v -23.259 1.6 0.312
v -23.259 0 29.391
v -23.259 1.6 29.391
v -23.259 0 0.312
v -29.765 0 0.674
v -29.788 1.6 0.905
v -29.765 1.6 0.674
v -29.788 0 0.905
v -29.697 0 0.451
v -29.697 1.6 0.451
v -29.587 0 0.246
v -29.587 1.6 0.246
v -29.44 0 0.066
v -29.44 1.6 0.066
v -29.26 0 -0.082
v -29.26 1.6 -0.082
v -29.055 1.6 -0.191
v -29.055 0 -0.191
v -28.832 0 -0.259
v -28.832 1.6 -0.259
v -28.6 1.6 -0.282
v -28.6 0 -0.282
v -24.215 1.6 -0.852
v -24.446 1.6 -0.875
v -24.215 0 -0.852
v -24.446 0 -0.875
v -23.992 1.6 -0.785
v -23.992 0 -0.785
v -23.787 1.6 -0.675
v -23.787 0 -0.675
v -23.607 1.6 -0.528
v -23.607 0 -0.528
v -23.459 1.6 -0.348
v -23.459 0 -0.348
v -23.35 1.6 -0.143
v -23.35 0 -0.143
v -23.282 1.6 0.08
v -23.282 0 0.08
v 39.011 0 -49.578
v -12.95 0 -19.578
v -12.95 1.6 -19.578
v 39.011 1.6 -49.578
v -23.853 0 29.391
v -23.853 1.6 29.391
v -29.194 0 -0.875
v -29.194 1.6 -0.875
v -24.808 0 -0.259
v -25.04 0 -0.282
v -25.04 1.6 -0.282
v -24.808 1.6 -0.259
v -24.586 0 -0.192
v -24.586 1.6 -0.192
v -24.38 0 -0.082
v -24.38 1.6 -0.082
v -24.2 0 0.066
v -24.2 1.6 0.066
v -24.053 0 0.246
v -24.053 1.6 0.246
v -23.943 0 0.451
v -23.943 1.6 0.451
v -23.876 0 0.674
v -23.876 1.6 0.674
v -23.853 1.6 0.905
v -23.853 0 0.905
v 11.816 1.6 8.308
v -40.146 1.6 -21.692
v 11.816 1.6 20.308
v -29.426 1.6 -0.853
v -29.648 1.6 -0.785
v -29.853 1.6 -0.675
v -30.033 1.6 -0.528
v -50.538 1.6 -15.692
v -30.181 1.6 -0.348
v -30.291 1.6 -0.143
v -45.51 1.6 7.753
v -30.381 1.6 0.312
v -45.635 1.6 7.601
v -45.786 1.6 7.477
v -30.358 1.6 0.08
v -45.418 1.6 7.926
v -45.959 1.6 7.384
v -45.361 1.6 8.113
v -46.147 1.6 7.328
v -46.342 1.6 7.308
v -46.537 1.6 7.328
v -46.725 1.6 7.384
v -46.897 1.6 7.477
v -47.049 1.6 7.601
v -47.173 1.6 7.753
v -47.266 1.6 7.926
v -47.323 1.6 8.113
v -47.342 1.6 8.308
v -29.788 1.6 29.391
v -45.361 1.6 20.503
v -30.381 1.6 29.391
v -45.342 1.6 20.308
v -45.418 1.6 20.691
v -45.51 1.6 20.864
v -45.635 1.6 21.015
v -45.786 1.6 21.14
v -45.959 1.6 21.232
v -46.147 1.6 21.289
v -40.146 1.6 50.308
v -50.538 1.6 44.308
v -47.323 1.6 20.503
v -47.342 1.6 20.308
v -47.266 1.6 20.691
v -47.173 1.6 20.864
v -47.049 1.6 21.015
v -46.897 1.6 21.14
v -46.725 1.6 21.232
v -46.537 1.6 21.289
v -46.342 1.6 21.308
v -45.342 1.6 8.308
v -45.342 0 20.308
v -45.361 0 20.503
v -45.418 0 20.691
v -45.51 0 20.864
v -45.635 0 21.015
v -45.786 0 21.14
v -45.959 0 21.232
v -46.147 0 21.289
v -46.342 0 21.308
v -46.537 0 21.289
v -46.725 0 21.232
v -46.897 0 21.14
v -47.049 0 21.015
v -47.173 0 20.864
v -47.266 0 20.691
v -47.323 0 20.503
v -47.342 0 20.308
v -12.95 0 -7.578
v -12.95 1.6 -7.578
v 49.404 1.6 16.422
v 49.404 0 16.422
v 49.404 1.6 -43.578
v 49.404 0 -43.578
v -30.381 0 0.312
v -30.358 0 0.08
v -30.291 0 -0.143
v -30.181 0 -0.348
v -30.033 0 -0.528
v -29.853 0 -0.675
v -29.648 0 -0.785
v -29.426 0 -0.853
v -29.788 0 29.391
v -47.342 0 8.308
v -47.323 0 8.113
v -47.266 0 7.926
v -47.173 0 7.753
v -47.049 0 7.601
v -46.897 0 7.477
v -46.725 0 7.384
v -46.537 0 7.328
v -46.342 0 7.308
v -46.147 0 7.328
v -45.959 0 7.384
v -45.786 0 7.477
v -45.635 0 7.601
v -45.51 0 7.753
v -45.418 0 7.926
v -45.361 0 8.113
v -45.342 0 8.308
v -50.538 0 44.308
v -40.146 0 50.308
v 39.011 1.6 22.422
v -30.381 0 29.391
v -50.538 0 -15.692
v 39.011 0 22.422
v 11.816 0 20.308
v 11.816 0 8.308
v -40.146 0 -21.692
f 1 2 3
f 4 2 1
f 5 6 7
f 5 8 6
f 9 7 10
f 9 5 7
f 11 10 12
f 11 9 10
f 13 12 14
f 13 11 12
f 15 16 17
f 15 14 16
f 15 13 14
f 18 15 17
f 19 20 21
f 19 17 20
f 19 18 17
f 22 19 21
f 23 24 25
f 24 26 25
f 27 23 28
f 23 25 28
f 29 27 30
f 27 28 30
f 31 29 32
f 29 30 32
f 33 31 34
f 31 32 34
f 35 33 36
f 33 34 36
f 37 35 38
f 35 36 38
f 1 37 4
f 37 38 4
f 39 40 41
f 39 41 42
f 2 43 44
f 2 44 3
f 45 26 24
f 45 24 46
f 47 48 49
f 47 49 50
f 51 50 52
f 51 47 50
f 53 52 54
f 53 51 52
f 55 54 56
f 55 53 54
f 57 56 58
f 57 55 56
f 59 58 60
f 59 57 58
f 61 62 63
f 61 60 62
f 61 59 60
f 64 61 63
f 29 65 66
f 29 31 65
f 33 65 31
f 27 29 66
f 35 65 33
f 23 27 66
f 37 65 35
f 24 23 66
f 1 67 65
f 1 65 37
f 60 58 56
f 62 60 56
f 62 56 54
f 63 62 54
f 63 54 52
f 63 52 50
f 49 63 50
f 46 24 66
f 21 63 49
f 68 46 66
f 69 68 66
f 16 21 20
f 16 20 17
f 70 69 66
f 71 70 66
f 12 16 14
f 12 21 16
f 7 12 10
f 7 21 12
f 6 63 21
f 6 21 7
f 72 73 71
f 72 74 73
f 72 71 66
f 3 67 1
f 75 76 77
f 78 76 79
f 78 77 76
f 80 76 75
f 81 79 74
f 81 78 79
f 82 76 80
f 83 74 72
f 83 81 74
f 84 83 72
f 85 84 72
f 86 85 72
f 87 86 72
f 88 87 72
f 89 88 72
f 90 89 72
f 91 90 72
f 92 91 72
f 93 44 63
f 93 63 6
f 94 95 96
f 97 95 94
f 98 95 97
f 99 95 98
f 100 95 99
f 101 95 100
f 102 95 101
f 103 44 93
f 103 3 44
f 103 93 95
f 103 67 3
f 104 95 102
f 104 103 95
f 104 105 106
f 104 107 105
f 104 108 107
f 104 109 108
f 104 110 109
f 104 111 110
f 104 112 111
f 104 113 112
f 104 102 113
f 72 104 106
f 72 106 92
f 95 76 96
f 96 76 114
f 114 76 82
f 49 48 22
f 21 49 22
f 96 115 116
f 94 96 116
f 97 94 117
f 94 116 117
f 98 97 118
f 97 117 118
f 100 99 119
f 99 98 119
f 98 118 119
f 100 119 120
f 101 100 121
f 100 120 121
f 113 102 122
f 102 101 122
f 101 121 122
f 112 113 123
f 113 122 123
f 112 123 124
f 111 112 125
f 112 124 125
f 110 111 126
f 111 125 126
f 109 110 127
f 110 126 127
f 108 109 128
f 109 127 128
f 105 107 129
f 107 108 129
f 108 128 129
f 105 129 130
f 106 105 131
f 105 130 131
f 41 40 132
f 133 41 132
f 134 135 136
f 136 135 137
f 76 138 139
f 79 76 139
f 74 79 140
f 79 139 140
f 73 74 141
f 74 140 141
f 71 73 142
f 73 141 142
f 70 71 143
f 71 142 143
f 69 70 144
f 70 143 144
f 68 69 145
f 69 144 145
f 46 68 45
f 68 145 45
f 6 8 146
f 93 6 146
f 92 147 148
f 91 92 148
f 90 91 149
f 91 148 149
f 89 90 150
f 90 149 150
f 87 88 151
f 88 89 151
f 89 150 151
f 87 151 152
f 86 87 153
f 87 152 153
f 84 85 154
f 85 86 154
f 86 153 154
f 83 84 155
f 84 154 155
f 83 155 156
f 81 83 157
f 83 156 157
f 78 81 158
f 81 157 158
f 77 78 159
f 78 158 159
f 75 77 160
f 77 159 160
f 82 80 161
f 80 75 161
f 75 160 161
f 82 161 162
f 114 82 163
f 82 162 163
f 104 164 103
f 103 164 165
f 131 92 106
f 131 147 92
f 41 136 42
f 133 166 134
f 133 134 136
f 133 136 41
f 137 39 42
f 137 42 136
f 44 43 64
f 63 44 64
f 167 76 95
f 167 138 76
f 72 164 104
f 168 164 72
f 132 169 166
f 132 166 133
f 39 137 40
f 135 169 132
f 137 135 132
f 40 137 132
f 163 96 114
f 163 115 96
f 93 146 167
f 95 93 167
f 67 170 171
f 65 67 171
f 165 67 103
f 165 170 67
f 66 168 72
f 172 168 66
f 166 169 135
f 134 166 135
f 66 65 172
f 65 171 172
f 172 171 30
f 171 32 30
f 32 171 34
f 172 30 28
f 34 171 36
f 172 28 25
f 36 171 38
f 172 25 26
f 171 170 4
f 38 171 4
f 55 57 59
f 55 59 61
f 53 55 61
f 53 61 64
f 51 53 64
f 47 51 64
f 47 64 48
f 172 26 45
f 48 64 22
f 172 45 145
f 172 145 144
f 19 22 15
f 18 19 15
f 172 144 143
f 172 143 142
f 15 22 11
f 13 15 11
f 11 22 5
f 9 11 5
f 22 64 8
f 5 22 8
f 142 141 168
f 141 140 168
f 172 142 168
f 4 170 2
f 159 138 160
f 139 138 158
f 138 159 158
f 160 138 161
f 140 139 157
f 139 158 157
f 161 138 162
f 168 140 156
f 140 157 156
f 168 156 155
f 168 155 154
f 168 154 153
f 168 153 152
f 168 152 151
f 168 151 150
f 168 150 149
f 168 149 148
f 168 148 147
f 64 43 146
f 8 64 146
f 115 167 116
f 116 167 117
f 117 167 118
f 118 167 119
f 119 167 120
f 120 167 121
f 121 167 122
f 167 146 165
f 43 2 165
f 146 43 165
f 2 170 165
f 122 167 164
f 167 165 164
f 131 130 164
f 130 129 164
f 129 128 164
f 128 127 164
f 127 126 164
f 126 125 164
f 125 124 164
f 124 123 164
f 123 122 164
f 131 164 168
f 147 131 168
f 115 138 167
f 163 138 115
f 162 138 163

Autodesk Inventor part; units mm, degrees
ref_plane "YZ Plane" through (0, 0, 0) normal (1, 0, 0) x (0, 1, 0)
ref_plane "XZ Plane" through (0, 0, 0) normal (0, 1, 0) x (-1, 0, 0)
ref_plane "XY Plane" through (0, 0, 0) normal (0, 0, 1) x (1, 0, 0)
sketch "Sketch1" plane through (0, 0, 0) normal (0, 1, 0) x (-1, 0, 0)
  line L0 (25.0398, -0.2818) -> (28.6005, -0.2818)
  line L1 (29.7875, 0.9051) -> (29.7875, 29.3913)
  line L2 (23.8528, 29.3913) -> (23.8528, 0.9051)
  arc A0 (28.6005, -0.2818) -> (29.7875, 0.9051) centre (28.6005, 0.9051) ccw
  arc A1 (23.8528, 0.9051) -> (25.0398, -0.2818) centre (25.0398, 0.9051) ccw
  line L3 (24.4463, -0.8753) -> (29.194, -0.8753)
  line L4 (30.3809, 0.3117) -> (30.3809, 29.3913)
  line L5 (23.2594, 29.3913) -> (23.2594, 0.3117)
  arc A2 (29.194, -0.8753) -> (30.3809, 0.3117) centre (29.194, 0.3117) ccw
  arc A3 (23.2594, 0.3117) -> (24.4463, -0.8753) centre (24.4463, 0.3117) ccw
  line L6 (29.7875, 29.3913) -> (30.3809, 29.3913)
  line L7 (23.8528, 29.3913) -> (23.2594, 29.3913)
  line L8 (-11.8158, 20.3083) -> (40.1457, 50.3083)
  line L9 (-11.8158, 8.3083) -> (40.1457, -21.6917)
  line L10 (50.538, 44.3083) -> (50.538, -15.6917)
  line L11 (50.538, 44.3083) -> (40.1457, 50.3083)
  line L12 (50.538, -15.6917) -> (40.1457, -21.6917)
  line L13 (-11.8158, 20.3083) -> (-11.8158, 8.3083)
  line L14 (-39.0112, 22.4219) -> (12.9503, -7.5781)
  line L15 (-49.4035, 16.4219) -> (-49.4035, -43.5781)
  line L16 (12.9503, -19.5781) -> (-39.0112, -49.5781)
  line L17 (12.9503, -19.5781) -> (12.9503, -7.5781)
  line L18 (-39.0112, -49.5781) -> (-49.4035, -43.5781)
  line L19 (-39.0112, 22.4219) -> (-49.4035, 16.4219)
  line L20 (45.3419, 20.3083) -> (45.3419, 8.3083)
  line L21 (47.3419, 8.3083) -> (47.3419, 20.3083)
  arc A4 (47.3419, 20.3083) -> (45.3419, 20.3083) centre (46.3419, 20.3083) ccw
  arc A5 (45.3419, 8.3083) -> (47.3419, 8.3083) centre (46.3419, 8.3083) ccw
  point P0 (0, 0)
  point P1 (0.0037, 0.0061)
extrude "Extrusion1" add sketch "Sketch1" along normal blind 1.6
properties part number "Bottom" material "Titanium"
